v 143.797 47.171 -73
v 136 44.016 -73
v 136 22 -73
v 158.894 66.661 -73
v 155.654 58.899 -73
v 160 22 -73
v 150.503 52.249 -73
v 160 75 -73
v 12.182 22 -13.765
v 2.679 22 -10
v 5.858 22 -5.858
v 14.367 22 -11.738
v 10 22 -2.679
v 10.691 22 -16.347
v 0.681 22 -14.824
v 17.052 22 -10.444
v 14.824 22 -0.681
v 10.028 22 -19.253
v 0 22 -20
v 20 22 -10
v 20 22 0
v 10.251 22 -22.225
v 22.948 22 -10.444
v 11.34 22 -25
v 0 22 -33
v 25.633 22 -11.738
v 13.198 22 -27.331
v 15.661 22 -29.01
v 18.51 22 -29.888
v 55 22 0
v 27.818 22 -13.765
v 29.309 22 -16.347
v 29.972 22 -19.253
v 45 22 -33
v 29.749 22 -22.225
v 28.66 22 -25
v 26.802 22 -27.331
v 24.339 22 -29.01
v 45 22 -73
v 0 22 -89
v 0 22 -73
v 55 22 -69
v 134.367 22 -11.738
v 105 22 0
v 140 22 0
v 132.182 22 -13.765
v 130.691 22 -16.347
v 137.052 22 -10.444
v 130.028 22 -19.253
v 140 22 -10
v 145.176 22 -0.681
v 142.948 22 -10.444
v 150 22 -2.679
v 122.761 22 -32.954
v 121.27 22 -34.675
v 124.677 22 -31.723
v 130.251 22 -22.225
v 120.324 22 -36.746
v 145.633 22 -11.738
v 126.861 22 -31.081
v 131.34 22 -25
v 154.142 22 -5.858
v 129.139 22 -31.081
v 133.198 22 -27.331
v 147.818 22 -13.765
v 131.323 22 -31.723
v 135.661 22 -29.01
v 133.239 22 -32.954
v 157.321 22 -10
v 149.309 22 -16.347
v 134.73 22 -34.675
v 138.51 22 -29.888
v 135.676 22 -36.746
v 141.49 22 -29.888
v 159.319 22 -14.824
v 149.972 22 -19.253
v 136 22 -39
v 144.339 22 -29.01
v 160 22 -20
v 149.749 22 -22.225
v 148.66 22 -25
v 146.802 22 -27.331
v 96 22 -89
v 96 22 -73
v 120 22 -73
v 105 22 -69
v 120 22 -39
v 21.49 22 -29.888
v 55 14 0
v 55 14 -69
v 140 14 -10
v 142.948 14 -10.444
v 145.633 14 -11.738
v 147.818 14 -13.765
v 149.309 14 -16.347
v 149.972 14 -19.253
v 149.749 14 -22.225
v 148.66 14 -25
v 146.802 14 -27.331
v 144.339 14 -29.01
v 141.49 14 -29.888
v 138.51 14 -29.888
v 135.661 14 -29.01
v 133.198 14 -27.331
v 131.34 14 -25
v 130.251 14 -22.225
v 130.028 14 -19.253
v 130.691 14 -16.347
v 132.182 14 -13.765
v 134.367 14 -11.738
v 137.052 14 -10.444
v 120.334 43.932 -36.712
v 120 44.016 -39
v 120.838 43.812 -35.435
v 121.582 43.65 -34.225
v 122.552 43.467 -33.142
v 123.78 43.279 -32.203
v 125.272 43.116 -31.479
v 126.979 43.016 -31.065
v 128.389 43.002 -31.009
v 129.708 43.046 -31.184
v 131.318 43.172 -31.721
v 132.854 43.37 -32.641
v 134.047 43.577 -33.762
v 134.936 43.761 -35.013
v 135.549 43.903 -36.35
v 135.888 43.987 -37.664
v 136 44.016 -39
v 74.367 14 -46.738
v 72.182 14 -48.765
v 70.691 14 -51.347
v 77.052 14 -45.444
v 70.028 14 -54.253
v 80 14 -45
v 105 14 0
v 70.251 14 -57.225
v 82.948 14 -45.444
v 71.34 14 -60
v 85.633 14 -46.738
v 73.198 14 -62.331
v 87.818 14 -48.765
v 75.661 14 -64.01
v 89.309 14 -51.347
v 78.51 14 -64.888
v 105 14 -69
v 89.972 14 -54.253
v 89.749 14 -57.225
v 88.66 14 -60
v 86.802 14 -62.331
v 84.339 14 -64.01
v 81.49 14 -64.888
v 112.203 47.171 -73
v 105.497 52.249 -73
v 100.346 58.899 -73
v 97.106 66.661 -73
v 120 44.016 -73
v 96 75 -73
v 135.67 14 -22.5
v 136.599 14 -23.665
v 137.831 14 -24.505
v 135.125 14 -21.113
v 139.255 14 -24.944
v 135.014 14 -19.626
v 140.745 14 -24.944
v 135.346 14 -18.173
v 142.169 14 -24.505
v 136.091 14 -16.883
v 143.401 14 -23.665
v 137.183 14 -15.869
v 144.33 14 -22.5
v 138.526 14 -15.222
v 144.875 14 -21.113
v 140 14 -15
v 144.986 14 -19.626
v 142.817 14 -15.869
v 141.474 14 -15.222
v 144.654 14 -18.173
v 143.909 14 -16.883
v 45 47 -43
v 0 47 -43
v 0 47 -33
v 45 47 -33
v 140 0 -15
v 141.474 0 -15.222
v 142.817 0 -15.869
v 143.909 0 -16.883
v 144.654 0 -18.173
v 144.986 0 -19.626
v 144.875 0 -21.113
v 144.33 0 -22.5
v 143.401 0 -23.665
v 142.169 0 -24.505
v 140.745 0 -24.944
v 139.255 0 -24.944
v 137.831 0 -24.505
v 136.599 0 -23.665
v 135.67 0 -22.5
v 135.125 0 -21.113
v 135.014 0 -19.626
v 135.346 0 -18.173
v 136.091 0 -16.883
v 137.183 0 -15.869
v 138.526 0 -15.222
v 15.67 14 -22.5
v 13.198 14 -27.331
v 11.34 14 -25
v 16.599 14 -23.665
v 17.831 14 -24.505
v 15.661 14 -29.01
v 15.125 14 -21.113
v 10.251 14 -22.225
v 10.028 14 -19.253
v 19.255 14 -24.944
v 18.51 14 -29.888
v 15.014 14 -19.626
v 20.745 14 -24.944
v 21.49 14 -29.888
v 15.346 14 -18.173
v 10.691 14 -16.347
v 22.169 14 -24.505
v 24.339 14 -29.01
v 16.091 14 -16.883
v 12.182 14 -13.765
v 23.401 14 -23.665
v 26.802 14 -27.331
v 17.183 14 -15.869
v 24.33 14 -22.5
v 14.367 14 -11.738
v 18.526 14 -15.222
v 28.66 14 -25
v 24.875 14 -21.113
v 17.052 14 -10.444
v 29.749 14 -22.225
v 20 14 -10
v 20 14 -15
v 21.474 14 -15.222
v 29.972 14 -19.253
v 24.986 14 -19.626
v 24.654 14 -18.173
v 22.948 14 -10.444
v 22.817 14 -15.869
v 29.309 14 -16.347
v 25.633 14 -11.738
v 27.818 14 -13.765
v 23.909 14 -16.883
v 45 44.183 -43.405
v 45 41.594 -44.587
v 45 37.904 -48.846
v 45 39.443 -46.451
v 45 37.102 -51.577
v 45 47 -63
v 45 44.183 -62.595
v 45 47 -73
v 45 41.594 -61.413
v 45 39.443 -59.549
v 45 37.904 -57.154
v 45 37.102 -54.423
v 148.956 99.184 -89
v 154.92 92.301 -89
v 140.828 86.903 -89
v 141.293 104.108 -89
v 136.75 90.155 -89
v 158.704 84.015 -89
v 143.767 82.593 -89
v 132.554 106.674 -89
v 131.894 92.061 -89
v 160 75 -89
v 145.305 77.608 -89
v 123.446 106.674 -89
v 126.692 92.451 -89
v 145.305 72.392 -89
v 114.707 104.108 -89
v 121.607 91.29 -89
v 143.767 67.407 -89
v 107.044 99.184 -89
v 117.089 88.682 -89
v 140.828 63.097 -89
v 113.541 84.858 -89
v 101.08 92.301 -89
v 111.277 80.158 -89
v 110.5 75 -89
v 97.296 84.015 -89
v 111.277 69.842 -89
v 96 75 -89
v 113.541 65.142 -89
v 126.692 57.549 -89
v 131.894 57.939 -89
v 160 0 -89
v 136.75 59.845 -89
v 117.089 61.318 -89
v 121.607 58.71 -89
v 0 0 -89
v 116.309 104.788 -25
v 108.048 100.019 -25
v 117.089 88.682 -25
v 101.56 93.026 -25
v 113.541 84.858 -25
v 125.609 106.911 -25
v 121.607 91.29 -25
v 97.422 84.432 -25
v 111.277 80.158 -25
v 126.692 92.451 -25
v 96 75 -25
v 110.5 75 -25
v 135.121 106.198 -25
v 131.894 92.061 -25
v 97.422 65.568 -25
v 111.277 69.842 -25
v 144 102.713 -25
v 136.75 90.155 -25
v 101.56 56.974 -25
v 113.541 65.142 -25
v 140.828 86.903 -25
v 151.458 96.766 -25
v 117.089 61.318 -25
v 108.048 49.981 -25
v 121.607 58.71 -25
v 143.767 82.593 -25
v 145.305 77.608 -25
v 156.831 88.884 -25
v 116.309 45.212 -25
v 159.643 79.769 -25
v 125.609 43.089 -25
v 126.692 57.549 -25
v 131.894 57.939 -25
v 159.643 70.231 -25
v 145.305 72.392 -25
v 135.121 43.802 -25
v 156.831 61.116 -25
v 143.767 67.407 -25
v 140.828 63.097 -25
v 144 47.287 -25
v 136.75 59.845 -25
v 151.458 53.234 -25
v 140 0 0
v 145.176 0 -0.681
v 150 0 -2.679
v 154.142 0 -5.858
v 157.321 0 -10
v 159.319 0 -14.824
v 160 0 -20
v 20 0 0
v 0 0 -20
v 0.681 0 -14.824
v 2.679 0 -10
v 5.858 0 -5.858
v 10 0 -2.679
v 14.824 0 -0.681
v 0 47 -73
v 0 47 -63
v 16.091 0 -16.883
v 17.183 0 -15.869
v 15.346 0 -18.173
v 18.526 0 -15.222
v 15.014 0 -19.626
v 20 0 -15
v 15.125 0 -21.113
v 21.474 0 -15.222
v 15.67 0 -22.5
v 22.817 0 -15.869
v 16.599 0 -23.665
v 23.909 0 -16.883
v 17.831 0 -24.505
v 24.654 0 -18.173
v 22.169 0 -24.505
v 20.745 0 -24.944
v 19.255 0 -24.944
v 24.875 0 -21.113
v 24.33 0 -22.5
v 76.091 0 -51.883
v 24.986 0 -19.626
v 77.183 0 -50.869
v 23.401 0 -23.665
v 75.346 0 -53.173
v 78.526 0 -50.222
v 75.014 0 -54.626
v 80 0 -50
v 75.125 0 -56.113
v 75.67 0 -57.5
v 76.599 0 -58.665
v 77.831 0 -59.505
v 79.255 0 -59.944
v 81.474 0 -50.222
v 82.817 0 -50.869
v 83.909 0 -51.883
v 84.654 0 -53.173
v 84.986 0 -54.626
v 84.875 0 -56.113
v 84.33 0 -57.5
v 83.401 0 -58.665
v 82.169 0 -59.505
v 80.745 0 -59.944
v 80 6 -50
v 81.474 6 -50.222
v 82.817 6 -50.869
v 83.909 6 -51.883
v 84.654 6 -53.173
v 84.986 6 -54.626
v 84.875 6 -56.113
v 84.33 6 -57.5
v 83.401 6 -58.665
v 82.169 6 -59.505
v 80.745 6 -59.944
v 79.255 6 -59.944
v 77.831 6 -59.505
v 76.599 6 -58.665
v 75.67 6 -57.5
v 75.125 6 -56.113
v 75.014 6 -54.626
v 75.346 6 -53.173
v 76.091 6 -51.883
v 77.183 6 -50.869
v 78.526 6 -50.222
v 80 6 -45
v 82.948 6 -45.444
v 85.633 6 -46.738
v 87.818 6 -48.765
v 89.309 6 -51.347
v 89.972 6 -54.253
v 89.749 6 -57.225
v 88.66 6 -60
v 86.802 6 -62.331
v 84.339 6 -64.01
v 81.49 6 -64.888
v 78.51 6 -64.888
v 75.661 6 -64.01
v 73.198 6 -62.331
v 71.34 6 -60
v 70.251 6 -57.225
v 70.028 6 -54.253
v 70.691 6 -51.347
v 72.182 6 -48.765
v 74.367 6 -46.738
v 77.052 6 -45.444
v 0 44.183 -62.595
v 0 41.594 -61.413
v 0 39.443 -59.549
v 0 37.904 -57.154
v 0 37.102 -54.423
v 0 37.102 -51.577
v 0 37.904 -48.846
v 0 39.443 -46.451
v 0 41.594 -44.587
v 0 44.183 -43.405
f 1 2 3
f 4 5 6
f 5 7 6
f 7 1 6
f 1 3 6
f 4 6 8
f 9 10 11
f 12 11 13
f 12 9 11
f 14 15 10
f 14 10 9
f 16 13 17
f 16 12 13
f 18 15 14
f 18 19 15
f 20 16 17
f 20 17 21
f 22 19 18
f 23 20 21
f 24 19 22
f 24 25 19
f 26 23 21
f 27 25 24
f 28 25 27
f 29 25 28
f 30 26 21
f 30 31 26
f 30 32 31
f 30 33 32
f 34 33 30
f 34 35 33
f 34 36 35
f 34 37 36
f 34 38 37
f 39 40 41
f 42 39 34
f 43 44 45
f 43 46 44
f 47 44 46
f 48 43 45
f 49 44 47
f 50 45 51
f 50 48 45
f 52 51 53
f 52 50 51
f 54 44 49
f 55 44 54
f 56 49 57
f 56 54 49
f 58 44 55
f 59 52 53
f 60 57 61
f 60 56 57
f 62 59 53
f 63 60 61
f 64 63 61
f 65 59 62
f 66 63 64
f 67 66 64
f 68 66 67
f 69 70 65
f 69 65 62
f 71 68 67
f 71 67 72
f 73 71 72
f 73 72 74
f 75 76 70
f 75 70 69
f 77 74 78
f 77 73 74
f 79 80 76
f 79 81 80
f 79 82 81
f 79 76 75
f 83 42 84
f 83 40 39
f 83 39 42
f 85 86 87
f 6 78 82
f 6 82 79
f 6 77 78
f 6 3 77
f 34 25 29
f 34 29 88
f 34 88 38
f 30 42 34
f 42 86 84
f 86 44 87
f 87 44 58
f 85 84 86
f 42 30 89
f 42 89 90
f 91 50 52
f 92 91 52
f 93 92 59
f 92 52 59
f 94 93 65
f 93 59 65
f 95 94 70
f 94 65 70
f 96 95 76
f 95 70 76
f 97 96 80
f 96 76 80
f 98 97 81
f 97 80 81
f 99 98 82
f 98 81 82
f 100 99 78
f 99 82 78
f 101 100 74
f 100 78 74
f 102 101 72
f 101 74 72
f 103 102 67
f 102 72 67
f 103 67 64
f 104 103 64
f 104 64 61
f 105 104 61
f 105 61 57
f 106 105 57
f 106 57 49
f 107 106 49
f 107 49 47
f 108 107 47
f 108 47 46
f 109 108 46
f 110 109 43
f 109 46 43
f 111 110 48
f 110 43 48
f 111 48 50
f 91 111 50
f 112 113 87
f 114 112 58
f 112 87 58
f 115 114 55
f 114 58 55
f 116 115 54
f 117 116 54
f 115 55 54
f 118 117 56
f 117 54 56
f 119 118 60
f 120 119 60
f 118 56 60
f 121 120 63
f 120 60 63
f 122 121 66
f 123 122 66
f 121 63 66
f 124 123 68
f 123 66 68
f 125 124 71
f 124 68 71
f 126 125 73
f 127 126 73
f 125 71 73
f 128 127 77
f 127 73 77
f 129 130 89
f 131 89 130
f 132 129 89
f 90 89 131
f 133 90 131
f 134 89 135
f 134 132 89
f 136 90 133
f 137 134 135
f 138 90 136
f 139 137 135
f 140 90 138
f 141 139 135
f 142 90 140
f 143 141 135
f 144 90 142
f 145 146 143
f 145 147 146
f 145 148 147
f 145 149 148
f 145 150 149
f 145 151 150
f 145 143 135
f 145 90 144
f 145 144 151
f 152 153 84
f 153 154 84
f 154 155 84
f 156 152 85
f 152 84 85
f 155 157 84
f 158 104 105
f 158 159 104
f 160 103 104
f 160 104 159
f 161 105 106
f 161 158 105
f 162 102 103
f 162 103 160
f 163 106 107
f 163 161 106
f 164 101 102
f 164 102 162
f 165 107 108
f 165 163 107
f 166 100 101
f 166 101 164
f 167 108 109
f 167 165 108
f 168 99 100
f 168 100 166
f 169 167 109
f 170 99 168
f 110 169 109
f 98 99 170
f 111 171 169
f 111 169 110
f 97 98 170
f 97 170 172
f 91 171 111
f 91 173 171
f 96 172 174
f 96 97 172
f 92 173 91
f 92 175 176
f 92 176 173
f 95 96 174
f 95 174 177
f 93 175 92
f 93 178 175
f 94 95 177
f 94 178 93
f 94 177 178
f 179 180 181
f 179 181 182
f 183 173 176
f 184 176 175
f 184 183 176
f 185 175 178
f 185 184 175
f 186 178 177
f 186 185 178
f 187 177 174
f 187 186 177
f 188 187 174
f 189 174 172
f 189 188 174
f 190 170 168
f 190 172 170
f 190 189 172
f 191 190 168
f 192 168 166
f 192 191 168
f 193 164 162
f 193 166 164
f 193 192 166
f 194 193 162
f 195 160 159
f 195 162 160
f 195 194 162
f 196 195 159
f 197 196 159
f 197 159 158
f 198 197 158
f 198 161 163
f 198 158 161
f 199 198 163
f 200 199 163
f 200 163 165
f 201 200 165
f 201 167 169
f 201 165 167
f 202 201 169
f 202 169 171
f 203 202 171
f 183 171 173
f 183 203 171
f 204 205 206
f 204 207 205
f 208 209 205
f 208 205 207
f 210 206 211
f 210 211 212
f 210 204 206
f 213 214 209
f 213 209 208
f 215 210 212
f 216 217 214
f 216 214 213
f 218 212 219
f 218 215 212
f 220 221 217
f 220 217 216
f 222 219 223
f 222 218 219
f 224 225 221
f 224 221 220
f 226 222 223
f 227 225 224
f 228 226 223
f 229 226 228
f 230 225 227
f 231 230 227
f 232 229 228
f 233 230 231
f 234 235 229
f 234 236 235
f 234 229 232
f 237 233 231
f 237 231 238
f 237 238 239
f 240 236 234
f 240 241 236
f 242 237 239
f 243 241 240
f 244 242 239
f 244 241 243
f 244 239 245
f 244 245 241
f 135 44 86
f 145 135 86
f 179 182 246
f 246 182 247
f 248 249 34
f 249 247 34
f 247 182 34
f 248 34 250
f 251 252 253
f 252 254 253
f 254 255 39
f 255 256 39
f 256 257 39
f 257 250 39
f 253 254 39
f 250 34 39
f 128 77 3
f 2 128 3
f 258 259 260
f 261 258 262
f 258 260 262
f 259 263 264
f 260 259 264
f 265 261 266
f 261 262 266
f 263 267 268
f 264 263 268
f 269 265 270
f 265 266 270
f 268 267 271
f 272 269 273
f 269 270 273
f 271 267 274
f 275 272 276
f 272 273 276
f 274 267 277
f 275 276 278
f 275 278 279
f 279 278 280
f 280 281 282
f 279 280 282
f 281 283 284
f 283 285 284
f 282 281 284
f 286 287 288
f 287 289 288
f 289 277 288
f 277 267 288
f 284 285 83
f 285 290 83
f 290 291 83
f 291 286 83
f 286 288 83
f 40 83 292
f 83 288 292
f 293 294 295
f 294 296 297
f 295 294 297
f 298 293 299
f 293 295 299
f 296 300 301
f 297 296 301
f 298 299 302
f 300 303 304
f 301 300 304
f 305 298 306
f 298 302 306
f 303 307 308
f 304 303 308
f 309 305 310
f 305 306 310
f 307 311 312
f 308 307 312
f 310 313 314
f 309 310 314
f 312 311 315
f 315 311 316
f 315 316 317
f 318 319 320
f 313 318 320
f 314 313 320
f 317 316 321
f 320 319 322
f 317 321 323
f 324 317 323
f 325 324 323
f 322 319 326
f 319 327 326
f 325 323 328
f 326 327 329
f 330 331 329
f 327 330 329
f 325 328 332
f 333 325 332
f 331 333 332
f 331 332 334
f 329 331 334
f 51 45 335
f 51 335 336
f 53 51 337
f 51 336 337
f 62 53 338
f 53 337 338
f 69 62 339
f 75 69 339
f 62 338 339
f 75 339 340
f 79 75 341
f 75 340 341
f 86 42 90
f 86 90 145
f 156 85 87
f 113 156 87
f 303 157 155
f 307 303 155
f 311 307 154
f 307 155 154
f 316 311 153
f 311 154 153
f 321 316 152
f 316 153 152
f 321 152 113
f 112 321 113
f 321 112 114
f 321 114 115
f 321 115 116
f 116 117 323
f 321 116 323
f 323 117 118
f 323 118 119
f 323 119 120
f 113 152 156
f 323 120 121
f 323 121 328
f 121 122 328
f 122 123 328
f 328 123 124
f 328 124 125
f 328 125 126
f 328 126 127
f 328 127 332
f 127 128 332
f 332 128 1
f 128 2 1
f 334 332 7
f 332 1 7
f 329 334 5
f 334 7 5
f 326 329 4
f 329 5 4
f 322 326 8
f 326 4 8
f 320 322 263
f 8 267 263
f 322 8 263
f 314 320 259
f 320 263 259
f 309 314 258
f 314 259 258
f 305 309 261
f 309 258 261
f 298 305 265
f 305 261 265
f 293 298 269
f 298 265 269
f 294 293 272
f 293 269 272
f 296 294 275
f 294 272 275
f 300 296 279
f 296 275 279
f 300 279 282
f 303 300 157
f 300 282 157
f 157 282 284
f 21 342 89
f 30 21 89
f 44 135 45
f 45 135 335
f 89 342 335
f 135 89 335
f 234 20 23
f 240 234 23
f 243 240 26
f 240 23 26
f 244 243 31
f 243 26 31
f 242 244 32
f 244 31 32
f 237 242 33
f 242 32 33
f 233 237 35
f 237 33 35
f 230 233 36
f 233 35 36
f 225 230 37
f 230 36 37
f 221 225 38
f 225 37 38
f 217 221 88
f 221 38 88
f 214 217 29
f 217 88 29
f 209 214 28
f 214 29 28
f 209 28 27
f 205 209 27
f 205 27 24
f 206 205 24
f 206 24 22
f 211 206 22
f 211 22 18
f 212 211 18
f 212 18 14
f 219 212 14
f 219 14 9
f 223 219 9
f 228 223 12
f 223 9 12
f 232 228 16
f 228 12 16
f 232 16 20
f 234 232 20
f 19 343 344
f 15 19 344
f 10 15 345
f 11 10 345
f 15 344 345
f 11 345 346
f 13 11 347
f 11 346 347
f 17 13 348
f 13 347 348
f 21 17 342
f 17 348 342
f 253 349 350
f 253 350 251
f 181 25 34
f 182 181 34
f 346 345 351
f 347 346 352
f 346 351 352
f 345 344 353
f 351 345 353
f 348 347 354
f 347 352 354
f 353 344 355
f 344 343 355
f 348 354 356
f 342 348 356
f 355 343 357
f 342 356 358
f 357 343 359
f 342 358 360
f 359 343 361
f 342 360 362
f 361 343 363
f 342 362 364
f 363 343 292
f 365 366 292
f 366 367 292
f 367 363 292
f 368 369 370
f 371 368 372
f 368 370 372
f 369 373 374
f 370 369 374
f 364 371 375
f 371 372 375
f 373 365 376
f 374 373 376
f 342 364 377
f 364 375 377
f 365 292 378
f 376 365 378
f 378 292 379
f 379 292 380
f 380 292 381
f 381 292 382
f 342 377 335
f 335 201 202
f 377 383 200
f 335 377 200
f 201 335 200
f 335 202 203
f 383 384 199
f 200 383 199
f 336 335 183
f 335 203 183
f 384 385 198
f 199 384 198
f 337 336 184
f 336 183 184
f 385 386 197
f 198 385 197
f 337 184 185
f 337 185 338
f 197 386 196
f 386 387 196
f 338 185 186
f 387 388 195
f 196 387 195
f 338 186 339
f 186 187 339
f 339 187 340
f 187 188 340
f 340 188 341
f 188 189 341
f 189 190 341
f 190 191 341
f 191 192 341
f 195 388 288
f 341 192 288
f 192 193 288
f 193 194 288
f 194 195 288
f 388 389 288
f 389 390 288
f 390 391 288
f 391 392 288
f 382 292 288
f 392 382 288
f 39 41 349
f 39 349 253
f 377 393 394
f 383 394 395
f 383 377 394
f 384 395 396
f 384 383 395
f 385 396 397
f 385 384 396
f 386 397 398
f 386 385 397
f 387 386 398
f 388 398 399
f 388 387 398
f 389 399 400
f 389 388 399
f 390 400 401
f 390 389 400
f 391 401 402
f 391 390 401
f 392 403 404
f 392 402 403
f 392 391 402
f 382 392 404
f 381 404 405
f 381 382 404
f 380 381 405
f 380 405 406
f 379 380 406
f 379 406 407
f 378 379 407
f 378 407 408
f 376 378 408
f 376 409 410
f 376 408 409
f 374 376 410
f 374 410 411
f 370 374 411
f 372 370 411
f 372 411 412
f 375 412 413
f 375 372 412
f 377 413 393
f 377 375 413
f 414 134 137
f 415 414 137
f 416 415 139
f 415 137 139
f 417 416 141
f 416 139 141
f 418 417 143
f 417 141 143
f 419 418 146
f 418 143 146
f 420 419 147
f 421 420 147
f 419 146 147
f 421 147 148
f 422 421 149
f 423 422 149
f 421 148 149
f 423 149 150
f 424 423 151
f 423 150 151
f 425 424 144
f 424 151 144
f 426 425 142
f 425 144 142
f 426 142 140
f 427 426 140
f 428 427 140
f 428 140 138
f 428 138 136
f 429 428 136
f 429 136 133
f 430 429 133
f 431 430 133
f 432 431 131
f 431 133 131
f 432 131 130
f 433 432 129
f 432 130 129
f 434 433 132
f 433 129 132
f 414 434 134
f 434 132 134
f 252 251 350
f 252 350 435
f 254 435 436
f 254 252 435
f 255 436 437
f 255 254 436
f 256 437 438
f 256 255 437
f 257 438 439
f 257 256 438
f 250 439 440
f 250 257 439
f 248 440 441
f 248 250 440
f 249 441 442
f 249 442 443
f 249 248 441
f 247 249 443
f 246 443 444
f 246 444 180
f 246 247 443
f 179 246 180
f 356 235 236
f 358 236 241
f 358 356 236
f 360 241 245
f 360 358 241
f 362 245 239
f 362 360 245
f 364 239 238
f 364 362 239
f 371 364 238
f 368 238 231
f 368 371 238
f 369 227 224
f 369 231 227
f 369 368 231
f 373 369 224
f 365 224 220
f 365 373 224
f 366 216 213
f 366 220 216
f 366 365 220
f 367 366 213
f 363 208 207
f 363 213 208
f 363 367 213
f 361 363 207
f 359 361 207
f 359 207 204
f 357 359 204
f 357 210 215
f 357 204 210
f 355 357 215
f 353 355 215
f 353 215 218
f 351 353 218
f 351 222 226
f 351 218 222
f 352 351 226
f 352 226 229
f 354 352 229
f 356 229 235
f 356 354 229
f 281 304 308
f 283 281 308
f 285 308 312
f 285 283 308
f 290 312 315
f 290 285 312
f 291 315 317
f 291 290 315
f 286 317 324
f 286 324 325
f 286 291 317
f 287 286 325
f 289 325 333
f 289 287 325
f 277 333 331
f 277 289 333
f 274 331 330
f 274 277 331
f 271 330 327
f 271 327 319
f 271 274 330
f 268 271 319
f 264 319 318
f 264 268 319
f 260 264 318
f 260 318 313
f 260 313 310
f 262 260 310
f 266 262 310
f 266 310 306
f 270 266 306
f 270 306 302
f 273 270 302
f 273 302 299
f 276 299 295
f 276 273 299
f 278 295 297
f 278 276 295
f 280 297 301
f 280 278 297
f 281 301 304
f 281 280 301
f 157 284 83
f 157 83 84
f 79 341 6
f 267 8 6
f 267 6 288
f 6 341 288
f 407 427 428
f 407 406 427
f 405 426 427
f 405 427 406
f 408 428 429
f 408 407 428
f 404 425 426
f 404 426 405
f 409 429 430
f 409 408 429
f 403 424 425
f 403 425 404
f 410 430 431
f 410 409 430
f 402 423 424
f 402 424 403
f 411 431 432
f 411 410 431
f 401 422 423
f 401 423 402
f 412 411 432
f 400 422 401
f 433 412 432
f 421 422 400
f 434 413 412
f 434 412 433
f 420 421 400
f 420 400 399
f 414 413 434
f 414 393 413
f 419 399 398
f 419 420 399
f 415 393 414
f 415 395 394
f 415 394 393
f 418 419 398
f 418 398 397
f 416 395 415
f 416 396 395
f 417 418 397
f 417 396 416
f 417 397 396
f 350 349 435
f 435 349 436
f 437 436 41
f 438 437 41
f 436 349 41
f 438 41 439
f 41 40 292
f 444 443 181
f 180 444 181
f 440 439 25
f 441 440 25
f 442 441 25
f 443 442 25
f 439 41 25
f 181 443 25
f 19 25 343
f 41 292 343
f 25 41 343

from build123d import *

# Parameters (mm, degrees)
CROQUIS2_R                   = 5
SALIENTE_EXTRUIR1_DEPTH      = 22
CROQUIS3_R                   = 10
CROQUIS3_W                   = 50
CROQUIS3_H                   = 69
CORTAR_EXTRUIR1_DEPTH        = 8
CROQUIS4_R                   = 10
CORTAR_EXTRUIR2_DEPTH        = 8
CROQUIS5_W                   = 14.5
CROQUIS5_H                   = 64
SALIENTE_EXTRUIR2_REACH      = 203.856
SALIENTE_EXTRUIR2_END_RADIUS = 32
CROQUIS9_W                   = 45
CROQUIS9_H                   = 40
SALIENTE_EXTRUIR3_DEPTH      = 25
CROQUIS10_W                  = 45
CROQUIS10_H                  = 10


with BuildPart() as part:
    # Croquis2 → Saliente-Extruir1 (new body)
    with BuildSketch(Plane(origin=(0, 0, 0), x_dir=(1, 0, 0), z_dir=(0, 1, 0))):
        with BuildLine():
            Line((20, 0), (140, 0))
            ThreePointArc((140, 0), (154.142135624, 5.857864376), (160, 20))
            Line((160, 20), (160, 89))
            Line((160, 89), (0, 89))
            Line((0, 89), (0, 20))
            ThreePointArc((0, 20), (5.857864376, 5.857864376), (20, 0))
        make_face()
        with Locations(Location((20, 20, 0), (0, 0, 270))):
            Circle(CROQUIS2_R, mode=Mode.SUBTRACT)
        with Locations(Location((140, 20, 0), (0, 0, 270))):
            Circle(CROQUIS2_R, mode=Mode.SUBTRACT)
        with Locations(Location((80, 55, 0), (0, 0, 270))):
            Circle(CROQUIS2_R, mode=Mode.SUBTRACT)
    extrude(amount=SALIENTE_EXTRUIR1_DEPTH)

    # Croquis3 → Cortar-Extruir1 (cut)
    with BuildSketch(Plane(origin=(0, 22, 0), x_dir=(1, 0, 0), z_dir=(0, 1, 0))):
        with Locations(Location((20, 20, 0), (0, 0, 270))):
            Circle(CROQUIS3_R)
        with Locations(Location((140, 20, 0), (0, 0, 270))):
            Circle(CROQUIS3_R)
        with Locations((80, 34.5)):
            Rectangle(CROQUIS3_W, CROQUIS3_H)
    extrude(amount=-CORTAR_EXTRUIR1_DEPTH, mode=Mode.SUBTRACT)

    # Croquis4 → Cortar-Extruir2 (cut)
    with BuildSketch(Plane(origin=(0, 14, 0), x_dir=(1, 0, 0), z_dir=(0, 1, 0))):
        with Locations(Location((80, 55, 0), (0, 0, 270))):
            Circle(CROQUIS4_R)
    extrude(amount=-CORTAR_EXTRUIR2_DEPTH, mode=Mode.SUBTRACT)



with BuildPart() as body_2:
    # Croquis5 → Revolución1 (revolve)
    with BuildSketch(Plane(origin=(0, 75, 0), x_dir=(1, 0, 0), z_dir=(0, 1, 0)), mode=Mode.PRIVATE) as revoluci_n1_sk:
        with Locations((152.75, 57)):
            Rectangle(CROQUIS5_W, CROQUIS5_H)
    revolve(revoluci_n1_sk.sketch.rotate(Axis((128, 75, -107.397420406), (0, 0, 1)), 180), axis=Axis((128, 75, -107.397420406), (0, 0, 1)))


with BuildPart() as part_1:
    add(part.part)

    add(body_2.part)  # Saliente-Extruir2 merges body 2
    # Saliente-Extruir2: up to this cylinder (the profile starts outside it)
    saliente_extruir2_end = Plane(origin=(128, 75, -70.113997), z_dir=(0, 0, -1)) * Cylinder(SALIENTE_EXTRUIR2_END_RADIUS, 472.712, mode=Mode.PRIVATE)
    # Croquis8 → Saliente-Extruir2 (add, up to the surface)
    with BuildSketch(Plane(origin=(0, 22, 0), x_dir=(1, 0, 0), z_dir=(0, 1, 0)), mode=Mode.PRIVATE) as saliente_extruir2_sk1:
        with BuildLine():
            Line((96, 89), (96, 73))
            Line((96, 73), (120, 73))
            Line((120, 73), (120, 39))
            ThreePointArc((120, 39), (128, 31), (136, 39))
            Line((136, 39), (136, 73))
            Line((136, 73), (160, 73))
            Line((160, 73), (160, 89))
            Line((160, 89), (96, 89))
        make_face()
    saliente_extruir2_tool1 = extrude(saliente_extruir2_sk1.sketch, amount=SALIENTE_EXTRUIR2_REACH, mode=Mode.PRIVATE) - saliente_extruir2_end
    add(saliente_extruir2_tool1.solids().sort_by_distance((128, 22, -70.113997))[0])

    # Croquis9 → Saliente-Extruir3 (add)
    with BuildSketch(Plane(origin=(0, 22, 0), x_dir=(1, 0, 0), z_dir=(0, 1, 0))):
        with Locations((22.5, 53)):
            Rectangle(CROQUIS9_W, CROQUIS9_H)
    extrude(amount=SALIENTE_EXTRUIR3_DEPTH)

    # Croquis10 → Cortar-Revolución1 (revolve, cut)
    with BuildSketch(Plane(origin=(0, 47, 0), x_dir=(1, 0, 0), z_dir=(0, 1, 0))):
        with Locations((22.5, 58)):
            Rectangle(CROQUIS10_W, CROQUIS10_H)
    revolve(axis=Axis((45, 47, -53), (-1, 0, 0)), mode=Mode.SUBTRACT)


solid = part_1.part
